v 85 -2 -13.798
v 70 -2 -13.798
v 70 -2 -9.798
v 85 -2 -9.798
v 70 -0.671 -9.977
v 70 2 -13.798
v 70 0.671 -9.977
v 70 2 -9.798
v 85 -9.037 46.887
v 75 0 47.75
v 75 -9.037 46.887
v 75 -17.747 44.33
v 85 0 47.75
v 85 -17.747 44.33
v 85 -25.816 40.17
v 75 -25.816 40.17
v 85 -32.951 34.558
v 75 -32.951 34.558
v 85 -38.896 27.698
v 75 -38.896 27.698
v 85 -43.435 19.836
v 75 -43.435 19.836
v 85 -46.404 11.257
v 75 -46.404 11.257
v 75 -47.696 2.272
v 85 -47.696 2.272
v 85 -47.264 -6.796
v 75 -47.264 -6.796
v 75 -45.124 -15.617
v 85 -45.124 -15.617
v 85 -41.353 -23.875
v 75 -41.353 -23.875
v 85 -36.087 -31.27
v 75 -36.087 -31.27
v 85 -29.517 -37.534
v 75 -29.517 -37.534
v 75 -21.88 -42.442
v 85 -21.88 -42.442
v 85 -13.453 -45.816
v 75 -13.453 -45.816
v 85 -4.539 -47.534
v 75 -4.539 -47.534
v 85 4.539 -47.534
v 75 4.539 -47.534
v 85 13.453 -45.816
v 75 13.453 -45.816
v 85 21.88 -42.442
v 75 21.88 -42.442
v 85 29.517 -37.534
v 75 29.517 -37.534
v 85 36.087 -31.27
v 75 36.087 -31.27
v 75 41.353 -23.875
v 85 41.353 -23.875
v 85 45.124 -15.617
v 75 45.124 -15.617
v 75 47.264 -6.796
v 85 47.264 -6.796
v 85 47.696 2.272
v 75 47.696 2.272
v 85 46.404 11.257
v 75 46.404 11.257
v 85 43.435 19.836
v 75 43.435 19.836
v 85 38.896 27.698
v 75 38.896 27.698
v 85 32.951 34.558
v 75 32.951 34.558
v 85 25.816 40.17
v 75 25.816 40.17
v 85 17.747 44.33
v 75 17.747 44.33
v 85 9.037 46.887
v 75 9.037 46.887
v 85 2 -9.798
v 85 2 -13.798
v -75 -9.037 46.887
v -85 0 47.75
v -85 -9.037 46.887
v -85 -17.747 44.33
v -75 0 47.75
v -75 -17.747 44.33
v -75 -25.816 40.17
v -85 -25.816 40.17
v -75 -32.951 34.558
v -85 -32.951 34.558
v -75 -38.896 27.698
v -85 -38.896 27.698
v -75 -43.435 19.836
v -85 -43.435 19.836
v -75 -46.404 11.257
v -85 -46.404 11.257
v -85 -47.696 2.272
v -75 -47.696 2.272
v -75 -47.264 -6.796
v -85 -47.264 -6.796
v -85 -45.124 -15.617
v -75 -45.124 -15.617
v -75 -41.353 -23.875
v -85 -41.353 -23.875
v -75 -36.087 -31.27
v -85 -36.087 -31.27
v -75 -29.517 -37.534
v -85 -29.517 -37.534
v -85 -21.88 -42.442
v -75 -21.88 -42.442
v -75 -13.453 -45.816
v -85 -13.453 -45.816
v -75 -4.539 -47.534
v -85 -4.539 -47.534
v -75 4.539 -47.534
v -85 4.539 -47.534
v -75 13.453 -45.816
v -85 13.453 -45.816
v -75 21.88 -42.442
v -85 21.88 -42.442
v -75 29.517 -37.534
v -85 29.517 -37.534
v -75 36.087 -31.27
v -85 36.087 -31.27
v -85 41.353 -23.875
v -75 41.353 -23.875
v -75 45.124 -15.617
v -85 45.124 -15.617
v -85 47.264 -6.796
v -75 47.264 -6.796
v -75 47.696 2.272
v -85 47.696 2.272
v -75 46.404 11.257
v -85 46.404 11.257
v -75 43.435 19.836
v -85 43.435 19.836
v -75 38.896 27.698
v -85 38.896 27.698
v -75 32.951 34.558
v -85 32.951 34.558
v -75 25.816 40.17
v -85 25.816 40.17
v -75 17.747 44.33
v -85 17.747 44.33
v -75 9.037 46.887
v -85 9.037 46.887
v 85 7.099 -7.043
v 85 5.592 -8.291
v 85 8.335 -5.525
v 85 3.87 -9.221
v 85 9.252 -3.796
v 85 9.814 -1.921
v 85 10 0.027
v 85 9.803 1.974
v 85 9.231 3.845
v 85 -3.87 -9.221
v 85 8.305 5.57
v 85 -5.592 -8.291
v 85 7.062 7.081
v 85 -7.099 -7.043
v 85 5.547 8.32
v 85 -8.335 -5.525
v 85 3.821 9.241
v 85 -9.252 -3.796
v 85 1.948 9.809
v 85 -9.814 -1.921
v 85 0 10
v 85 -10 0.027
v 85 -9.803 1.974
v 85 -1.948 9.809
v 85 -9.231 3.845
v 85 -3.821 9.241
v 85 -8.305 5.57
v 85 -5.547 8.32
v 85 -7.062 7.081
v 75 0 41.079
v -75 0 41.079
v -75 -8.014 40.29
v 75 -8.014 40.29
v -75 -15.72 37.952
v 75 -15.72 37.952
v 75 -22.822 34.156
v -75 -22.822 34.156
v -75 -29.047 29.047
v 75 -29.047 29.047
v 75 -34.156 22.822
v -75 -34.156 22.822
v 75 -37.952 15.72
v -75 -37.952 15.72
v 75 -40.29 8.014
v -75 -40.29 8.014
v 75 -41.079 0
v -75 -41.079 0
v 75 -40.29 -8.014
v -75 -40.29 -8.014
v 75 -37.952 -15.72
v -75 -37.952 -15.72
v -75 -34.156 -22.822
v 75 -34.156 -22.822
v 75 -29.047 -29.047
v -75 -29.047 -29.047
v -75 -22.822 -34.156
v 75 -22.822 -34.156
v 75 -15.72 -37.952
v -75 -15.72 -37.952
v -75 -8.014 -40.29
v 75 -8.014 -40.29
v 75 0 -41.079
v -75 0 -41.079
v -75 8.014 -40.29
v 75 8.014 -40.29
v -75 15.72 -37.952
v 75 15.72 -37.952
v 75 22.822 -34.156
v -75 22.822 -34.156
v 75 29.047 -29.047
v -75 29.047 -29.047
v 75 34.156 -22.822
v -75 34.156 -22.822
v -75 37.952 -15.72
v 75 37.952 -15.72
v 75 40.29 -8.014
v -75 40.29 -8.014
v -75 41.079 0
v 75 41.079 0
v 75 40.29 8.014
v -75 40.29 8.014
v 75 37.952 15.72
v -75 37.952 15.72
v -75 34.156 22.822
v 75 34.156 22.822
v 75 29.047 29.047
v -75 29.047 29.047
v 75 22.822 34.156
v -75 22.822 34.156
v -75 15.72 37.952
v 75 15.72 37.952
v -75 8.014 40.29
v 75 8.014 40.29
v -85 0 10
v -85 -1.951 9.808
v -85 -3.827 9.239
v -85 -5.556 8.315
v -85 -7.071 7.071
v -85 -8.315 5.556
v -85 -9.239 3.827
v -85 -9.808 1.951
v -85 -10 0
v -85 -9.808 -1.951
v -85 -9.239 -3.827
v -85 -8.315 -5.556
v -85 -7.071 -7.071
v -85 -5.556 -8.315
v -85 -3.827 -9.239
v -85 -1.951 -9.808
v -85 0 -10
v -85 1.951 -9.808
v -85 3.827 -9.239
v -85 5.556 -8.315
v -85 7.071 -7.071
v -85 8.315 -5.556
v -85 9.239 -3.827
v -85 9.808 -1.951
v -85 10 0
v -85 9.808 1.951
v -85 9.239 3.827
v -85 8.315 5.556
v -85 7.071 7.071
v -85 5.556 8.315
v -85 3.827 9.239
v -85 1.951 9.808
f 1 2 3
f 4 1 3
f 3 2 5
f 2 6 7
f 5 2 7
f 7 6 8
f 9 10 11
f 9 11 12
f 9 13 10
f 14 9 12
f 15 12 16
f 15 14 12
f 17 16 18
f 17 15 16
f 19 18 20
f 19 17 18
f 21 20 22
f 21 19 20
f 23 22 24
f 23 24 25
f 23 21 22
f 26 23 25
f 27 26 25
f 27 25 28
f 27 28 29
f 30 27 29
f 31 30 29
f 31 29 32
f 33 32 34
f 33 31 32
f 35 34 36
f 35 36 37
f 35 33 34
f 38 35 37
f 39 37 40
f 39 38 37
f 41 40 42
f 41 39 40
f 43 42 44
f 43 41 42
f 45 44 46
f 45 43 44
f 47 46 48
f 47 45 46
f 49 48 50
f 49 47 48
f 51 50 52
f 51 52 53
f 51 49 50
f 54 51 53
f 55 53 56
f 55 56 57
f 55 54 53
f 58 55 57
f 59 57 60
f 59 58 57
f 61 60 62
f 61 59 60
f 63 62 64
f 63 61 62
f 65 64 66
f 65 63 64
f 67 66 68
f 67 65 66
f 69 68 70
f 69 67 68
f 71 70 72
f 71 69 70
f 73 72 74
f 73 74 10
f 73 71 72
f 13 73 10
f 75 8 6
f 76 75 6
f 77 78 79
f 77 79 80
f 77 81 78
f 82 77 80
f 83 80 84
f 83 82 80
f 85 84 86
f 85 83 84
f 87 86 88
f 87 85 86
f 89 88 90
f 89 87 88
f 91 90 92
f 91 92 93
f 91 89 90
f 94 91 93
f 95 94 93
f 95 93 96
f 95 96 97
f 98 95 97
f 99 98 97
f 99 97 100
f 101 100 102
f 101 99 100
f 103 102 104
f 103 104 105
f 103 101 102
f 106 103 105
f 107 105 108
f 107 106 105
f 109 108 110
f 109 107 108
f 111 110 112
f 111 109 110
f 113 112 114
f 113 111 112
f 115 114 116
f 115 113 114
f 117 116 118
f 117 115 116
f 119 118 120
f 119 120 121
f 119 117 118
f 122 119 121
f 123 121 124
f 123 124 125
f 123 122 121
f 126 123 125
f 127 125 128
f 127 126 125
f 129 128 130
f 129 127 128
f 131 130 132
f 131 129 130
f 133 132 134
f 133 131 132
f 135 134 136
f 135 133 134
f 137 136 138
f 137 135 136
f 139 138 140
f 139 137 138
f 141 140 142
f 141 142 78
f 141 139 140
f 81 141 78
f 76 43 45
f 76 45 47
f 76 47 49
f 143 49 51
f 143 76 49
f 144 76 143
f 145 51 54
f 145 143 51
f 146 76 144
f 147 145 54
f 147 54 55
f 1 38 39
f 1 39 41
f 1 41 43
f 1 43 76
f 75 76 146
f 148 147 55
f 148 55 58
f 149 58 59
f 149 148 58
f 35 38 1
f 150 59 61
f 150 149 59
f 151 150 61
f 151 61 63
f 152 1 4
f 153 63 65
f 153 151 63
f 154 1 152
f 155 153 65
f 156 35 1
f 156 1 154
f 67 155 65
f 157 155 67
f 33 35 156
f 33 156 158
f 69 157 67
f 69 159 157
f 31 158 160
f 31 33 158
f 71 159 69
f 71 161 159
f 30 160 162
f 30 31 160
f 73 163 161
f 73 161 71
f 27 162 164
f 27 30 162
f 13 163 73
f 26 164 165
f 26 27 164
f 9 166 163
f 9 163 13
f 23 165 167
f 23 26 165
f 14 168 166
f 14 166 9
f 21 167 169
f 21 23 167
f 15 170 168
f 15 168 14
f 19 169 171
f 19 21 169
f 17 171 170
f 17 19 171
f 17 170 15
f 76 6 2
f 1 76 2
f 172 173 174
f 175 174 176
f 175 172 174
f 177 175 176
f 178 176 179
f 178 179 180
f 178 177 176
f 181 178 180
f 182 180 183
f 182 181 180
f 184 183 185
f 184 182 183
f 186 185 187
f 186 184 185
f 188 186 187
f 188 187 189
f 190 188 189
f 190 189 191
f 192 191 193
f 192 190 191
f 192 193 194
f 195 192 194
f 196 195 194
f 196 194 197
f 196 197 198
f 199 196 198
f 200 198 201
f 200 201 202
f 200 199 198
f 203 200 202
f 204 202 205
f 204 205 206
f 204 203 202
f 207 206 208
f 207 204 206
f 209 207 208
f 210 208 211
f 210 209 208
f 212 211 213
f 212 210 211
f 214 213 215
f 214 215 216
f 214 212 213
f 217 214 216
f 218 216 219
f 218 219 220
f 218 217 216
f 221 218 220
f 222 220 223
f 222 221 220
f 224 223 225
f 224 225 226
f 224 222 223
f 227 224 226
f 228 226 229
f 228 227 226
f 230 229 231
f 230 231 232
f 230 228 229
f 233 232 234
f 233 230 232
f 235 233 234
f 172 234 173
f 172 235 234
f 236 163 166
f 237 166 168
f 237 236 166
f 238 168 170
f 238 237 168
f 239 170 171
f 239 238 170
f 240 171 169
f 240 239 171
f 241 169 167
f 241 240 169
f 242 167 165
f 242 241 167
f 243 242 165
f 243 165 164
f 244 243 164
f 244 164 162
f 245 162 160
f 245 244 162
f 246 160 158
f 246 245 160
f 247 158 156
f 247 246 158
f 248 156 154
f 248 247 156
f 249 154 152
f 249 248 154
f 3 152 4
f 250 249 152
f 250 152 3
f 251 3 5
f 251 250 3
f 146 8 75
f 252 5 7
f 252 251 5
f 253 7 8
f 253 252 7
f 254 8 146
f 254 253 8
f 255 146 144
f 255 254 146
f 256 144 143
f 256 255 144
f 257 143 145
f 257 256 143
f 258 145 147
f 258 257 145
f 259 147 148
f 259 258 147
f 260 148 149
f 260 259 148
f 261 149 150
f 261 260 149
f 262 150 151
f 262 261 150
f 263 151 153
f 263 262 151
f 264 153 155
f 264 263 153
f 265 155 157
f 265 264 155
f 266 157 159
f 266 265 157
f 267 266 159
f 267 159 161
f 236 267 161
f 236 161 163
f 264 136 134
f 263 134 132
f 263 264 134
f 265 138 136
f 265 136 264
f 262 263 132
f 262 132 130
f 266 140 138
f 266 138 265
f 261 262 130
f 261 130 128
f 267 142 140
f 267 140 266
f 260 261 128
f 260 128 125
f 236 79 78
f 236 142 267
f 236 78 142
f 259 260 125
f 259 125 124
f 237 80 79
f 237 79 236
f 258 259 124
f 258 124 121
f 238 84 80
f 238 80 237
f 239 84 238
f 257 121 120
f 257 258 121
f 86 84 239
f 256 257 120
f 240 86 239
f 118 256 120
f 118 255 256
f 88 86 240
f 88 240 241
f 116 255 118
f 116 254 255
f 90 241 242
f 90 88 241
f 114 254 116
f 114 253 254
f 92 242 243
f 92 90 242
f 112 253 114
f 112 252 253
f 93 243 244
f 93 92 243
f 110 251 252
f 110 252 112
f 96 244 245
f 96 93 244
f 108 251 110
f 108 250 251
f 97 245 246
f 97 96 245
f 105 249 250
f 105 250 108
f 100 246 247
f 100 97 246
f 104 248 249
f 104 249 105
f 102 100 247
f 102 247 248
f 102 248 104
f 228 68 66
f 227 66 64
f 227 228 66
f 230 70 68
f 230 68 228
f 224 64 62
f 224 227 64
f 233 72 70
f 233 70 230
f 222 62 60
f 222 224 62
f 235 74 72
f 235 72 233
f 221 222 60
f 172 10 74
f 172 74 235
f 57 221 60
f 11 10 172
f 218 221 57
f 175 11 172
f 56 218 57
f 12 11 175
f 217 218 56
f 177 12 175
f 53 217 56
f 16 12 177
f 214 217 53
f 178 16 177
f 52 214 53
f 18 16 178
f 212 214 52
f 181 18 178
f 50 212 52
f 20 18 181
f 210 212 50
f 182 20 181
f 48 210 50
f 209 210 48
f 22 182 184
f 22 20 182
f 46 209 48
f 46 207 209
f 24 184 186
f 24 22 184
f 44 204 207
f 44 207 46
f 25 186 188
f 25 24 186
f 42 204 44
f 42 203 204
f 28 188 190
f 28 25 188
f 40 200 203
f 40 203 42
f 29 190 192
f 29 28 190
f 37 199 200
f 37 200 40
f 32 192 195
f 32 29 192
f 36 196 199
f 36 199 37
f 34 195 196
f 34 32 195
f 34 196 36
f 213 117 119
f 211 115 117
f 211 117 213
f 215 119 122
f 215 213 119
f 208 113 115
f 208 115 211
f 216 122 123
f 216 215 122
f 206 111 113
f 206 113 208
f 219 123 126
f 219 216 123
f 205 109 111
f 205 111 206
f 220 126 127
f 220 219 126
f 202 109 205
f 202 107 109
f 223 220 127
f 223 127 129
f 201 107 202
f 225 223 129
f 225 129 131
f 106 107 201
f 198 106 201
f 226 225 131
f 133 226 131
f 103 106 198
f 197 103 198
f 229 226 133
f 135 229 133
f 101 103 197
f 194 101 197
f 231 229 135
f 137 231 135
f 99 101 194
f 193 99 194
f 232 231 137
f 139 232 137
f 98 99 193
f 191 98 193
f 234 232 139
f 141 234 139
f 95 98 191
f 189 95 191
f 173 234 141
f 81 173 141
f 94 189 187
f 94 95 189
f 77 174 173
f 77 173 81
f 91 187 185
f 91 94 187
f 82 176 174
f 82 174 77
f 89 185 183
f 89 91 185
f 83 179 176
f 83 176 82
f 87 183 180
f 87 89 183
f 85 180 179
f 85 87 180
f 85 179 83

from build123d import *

# Parameters (mm, degrees)
CUT_EXTRUDE_START   = -15
CUT_EXTRUDE_1_DEPTH = 15


with BuildPart() as part:
    # 草图1 → 旋转1 (revolve)
    with BuildSketch(Plane(origin=(0, 0, 0), x_dir=(1, 0, 0), z_dir=(0, 1, 0)), mode=Mode.PRIVATE) as revolve_1_sk:
        Polygon((-85, 10), (-85, 47.75), (-75, 47.75), (-75, 41.078952229), (75, 41.078952229), (75, 47.75), (85, 47.75), (85, 10), align=None)
    revolve(revolve_1_sk.sketch.rotate(Axis((-58.327347129, 0, 0), (1, 0, 0)), 180), axis=Axis((-58.327347129, 0, 0), (1, 0, 0)))

    # 草图2 → 切除-拉伸1 (cut)
    with BuildSketch(Plane(origin=(85, 0, 0), x_dir=(0, 0, -1), z_dir=(1, 0, 0)).offset(CUT_EXTRUDE_START)):
        with BuildLine():
            Line((9.797958971, 2), (13.797958971, 2))
            Line((13.797958971, 2), (13.797958971, -2))
            Line((13.797958971, -2), (9.797958971, -2))
            ThreePointArc((9.797958971, -2), (10, 0), (9.797958971, 2))
        make_face()
    extrude(amount=CUT_EXTRUDE_1_DEPTH, mode=Mode.SUBTRACT)


solid = part.part
